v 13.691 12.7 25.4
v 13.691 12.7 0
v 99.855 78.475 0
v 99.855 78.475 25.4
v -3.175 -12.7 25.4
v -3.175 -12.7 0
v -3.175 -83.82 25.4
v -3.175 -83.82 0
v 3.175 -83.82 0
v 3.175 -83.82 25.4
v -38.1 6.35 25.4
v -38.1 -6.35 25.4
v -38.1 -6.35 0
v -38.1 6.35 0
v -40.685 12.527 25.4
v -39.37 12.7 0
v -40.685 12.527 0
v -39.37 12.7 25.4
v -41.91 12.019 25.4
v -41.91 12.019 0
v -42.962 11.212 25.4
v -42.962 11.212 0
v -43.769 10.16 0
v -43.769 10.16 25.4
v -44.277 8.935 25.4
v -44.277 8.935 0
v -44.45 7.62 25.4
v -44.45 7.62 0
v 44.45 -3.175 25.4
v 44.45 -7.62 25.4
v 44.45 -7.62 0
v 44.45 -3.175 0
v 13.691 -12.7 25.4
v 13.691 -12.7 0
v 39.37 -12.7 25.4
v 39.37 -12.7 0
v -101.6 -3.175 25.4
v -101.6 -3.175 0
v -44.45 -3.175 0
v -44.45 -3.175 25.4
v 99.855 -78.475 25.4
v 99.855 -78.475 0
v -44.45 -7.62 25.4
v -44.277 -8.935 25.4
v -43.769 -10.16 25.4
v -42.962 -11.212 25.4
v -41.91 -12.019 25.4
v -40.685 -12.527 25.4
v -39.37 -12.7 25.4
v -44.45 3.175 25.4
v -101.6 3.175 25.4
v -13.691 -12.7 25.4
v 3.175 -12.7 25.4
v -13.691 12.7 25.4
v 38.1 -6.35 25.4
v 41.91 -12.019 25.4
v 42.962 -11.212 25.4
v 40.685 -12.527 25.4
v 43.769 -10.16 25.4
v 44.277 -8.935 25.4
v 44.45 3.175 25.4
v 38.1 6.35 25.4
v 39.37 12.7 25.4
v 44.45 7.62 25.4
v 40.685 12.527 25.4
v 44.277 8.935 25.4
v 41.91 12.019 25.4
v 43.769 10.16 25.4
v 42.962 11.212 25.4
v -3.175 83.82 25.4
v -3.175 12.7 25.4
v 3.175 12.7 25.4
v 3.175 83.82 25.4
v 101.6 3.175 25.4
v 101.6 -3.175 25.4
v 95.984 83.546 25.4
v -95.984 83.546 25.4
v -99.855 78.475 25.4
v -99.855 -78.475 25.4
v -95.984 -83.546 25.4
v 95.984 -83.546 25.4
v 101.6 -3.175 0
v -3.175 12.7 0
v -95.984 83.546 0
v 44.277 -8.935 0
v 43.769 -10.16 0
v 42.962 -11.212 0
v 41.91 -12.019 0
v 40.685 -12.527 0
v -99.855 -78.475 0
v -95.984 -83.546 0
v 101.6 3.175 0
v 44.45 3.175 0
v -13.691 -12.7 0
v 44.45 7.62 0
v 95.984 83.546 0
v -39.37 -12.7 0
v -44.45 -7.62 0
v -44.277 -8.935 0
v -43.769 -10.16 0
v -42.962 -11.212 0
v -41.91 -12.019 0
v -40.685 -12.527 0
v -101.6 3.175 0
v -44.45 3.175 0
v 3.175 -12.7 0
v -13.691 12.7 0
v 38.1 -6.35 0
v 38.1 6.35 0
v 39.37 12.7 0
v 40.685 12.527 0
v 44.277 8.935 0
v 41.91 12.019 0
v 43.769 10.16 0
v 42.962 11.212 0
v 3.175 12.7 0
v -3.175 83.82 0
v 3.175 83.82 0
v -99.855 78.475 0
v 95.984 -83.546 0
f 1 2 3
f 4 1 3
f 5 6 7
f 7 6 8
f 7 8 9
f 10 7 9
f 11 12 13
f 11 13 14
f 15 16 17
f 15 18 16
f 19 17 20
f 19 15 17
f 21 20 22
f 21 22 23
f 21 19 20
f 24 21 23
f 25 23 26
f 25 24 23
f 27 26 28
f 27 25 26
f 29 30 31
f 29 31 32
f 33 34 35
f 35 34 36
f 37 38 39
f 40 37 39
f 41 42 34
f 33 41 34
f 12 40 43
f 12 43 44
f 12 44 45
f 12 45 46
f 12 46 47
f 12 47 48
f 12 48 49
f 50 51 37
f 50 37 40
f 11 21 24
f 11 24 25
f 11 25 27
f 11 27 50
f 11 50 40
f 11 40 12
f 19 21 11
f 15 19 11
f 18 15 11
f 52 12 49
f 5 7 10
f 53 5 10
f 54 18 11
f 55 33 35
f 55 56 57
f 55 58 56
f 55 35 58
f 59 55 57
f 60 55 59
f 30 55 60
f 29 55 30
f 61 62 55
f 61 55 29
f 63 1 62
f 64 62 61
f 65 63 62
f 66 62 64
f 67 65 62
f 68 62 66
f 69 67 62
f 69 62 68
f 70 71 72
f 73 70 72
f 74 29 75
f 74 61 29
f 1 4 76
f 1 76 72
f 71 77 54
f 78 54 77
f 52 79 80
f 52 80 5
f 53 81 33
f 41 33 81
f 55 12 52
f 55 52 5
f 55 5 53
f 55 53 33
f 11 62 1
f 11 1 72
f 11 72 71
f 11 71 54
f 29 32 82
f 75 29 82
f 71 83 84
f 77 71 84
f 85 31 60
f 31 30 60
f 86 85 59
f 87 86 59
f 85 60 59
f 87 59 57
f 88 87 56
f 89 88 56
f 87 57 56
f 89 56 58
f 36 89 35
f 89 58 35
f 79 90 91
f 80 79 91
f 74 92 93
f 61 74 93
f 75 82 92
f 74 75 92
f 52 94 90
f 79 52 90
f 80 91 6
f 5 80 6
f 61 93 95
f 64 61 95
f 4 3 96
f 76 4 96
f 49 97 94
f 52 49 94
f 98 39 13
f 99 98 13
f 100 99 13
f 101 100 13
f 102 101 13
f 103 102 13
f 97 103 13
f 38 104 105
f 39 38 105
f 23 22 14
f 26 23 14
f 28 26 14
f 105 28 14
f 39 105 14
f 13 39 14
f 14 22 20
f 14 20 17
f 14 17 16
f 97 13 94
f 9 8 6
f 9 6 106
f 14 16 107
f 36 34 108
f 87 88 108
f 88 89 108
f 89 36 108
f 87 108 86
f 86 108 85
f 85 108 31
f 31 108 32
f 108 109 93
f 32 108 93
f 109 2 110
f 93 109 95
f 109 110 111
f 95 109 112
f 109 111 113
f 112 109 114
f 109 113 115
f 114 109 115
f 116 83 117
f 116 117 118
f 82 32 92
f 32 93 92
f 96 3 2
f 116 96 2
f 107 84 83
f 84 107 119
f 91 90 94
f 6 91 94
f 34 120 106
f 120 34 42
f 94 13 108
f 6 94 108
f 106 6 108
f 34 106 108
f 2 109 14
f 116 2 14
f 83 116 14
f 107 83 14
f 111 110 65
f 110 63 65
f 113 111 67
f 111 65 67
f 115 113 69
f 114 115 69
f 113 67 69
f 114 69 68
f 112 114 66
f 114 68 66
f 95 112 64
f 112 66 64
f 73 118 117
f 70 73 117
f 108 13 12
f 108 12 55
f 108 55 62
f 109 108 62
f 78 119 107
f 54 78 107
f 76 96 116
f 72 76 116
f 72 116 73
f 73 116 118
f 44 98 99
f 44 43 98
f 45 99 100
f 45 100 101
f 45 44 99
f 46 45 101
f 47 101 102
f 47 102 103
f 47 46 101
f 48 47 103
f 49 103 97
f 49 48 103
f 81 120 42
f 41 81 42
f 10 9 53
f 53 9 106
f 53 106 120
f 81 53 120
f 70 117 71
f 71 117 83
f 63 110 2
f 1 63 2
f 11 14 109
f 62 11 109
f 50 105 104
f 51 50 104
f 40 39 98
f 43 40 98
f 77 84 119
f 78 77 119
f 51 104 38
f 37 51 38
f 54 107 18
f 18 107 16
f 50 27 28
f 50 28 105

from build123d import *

# Parameters (mm, degrees)
SKETCH1_W           = 76.2
SKETCH1_H           = 12.7
BOSS_EXTRUDE1_DEPTH = 25.4
FILLET1_R           = 5.08


with BuildPart() as part:
    # Sketch1 → Boss-Extrude1 (new body)
    with BuildSketch(Plane.XY):
        Polygon((44.45, 12.7), (13.6906, 12.7), (99.855246, 78.474538932), (95.983665425, 83.546309485), (3.175, 12.7), (3.175, 83.82), (-3.175, 83.82), (-3.175, 12.7), (-95.983665425, 83.546309485), (-99.855246, 78.474538932), (-13.6906, 12.7), (-44.45, 12.7), (-44.45, 3.175), (-101.6, 3.175), (-101.6, -3.175), (-44.45, -3.175), (-44.45, -12.7), (-13.6906, -12.7), (-99.855246, -78.474538932), (-95.983665425, -83.546309485), (-3.175, -12.7), (-3.175, -83.82), (3.175, -83.82), (3.175, -12.7), (95.983665425, -83.546309485), (99.855246, -78.474538932), (13.6906, -12.7), (44.45, -12.7), (44.45, -3.175), (101.6, -3.175), (101.6, 3.175), (44.45, 3.175), align=None)
        Rectangle(SKETCH1_W, SKETCH1_H, mode=Mode.SUBTRACT)
    extrude(amount=BOSS_EXTRUDE1_DEPTH)

    # Fillet1
    fillet1_edges = [part.edges().sort_by_distance(p)[0] for p in [
        (44.45, 12.7, 12.7),
        (44.45, -12.7, 12.7),
        (-44.45, -12.7, 12.7),
        (-44.45, 12.7, 12.7),
    ]]
    fillet(fillet1_edges, radius=FILLET1_R)


solid = part.part
